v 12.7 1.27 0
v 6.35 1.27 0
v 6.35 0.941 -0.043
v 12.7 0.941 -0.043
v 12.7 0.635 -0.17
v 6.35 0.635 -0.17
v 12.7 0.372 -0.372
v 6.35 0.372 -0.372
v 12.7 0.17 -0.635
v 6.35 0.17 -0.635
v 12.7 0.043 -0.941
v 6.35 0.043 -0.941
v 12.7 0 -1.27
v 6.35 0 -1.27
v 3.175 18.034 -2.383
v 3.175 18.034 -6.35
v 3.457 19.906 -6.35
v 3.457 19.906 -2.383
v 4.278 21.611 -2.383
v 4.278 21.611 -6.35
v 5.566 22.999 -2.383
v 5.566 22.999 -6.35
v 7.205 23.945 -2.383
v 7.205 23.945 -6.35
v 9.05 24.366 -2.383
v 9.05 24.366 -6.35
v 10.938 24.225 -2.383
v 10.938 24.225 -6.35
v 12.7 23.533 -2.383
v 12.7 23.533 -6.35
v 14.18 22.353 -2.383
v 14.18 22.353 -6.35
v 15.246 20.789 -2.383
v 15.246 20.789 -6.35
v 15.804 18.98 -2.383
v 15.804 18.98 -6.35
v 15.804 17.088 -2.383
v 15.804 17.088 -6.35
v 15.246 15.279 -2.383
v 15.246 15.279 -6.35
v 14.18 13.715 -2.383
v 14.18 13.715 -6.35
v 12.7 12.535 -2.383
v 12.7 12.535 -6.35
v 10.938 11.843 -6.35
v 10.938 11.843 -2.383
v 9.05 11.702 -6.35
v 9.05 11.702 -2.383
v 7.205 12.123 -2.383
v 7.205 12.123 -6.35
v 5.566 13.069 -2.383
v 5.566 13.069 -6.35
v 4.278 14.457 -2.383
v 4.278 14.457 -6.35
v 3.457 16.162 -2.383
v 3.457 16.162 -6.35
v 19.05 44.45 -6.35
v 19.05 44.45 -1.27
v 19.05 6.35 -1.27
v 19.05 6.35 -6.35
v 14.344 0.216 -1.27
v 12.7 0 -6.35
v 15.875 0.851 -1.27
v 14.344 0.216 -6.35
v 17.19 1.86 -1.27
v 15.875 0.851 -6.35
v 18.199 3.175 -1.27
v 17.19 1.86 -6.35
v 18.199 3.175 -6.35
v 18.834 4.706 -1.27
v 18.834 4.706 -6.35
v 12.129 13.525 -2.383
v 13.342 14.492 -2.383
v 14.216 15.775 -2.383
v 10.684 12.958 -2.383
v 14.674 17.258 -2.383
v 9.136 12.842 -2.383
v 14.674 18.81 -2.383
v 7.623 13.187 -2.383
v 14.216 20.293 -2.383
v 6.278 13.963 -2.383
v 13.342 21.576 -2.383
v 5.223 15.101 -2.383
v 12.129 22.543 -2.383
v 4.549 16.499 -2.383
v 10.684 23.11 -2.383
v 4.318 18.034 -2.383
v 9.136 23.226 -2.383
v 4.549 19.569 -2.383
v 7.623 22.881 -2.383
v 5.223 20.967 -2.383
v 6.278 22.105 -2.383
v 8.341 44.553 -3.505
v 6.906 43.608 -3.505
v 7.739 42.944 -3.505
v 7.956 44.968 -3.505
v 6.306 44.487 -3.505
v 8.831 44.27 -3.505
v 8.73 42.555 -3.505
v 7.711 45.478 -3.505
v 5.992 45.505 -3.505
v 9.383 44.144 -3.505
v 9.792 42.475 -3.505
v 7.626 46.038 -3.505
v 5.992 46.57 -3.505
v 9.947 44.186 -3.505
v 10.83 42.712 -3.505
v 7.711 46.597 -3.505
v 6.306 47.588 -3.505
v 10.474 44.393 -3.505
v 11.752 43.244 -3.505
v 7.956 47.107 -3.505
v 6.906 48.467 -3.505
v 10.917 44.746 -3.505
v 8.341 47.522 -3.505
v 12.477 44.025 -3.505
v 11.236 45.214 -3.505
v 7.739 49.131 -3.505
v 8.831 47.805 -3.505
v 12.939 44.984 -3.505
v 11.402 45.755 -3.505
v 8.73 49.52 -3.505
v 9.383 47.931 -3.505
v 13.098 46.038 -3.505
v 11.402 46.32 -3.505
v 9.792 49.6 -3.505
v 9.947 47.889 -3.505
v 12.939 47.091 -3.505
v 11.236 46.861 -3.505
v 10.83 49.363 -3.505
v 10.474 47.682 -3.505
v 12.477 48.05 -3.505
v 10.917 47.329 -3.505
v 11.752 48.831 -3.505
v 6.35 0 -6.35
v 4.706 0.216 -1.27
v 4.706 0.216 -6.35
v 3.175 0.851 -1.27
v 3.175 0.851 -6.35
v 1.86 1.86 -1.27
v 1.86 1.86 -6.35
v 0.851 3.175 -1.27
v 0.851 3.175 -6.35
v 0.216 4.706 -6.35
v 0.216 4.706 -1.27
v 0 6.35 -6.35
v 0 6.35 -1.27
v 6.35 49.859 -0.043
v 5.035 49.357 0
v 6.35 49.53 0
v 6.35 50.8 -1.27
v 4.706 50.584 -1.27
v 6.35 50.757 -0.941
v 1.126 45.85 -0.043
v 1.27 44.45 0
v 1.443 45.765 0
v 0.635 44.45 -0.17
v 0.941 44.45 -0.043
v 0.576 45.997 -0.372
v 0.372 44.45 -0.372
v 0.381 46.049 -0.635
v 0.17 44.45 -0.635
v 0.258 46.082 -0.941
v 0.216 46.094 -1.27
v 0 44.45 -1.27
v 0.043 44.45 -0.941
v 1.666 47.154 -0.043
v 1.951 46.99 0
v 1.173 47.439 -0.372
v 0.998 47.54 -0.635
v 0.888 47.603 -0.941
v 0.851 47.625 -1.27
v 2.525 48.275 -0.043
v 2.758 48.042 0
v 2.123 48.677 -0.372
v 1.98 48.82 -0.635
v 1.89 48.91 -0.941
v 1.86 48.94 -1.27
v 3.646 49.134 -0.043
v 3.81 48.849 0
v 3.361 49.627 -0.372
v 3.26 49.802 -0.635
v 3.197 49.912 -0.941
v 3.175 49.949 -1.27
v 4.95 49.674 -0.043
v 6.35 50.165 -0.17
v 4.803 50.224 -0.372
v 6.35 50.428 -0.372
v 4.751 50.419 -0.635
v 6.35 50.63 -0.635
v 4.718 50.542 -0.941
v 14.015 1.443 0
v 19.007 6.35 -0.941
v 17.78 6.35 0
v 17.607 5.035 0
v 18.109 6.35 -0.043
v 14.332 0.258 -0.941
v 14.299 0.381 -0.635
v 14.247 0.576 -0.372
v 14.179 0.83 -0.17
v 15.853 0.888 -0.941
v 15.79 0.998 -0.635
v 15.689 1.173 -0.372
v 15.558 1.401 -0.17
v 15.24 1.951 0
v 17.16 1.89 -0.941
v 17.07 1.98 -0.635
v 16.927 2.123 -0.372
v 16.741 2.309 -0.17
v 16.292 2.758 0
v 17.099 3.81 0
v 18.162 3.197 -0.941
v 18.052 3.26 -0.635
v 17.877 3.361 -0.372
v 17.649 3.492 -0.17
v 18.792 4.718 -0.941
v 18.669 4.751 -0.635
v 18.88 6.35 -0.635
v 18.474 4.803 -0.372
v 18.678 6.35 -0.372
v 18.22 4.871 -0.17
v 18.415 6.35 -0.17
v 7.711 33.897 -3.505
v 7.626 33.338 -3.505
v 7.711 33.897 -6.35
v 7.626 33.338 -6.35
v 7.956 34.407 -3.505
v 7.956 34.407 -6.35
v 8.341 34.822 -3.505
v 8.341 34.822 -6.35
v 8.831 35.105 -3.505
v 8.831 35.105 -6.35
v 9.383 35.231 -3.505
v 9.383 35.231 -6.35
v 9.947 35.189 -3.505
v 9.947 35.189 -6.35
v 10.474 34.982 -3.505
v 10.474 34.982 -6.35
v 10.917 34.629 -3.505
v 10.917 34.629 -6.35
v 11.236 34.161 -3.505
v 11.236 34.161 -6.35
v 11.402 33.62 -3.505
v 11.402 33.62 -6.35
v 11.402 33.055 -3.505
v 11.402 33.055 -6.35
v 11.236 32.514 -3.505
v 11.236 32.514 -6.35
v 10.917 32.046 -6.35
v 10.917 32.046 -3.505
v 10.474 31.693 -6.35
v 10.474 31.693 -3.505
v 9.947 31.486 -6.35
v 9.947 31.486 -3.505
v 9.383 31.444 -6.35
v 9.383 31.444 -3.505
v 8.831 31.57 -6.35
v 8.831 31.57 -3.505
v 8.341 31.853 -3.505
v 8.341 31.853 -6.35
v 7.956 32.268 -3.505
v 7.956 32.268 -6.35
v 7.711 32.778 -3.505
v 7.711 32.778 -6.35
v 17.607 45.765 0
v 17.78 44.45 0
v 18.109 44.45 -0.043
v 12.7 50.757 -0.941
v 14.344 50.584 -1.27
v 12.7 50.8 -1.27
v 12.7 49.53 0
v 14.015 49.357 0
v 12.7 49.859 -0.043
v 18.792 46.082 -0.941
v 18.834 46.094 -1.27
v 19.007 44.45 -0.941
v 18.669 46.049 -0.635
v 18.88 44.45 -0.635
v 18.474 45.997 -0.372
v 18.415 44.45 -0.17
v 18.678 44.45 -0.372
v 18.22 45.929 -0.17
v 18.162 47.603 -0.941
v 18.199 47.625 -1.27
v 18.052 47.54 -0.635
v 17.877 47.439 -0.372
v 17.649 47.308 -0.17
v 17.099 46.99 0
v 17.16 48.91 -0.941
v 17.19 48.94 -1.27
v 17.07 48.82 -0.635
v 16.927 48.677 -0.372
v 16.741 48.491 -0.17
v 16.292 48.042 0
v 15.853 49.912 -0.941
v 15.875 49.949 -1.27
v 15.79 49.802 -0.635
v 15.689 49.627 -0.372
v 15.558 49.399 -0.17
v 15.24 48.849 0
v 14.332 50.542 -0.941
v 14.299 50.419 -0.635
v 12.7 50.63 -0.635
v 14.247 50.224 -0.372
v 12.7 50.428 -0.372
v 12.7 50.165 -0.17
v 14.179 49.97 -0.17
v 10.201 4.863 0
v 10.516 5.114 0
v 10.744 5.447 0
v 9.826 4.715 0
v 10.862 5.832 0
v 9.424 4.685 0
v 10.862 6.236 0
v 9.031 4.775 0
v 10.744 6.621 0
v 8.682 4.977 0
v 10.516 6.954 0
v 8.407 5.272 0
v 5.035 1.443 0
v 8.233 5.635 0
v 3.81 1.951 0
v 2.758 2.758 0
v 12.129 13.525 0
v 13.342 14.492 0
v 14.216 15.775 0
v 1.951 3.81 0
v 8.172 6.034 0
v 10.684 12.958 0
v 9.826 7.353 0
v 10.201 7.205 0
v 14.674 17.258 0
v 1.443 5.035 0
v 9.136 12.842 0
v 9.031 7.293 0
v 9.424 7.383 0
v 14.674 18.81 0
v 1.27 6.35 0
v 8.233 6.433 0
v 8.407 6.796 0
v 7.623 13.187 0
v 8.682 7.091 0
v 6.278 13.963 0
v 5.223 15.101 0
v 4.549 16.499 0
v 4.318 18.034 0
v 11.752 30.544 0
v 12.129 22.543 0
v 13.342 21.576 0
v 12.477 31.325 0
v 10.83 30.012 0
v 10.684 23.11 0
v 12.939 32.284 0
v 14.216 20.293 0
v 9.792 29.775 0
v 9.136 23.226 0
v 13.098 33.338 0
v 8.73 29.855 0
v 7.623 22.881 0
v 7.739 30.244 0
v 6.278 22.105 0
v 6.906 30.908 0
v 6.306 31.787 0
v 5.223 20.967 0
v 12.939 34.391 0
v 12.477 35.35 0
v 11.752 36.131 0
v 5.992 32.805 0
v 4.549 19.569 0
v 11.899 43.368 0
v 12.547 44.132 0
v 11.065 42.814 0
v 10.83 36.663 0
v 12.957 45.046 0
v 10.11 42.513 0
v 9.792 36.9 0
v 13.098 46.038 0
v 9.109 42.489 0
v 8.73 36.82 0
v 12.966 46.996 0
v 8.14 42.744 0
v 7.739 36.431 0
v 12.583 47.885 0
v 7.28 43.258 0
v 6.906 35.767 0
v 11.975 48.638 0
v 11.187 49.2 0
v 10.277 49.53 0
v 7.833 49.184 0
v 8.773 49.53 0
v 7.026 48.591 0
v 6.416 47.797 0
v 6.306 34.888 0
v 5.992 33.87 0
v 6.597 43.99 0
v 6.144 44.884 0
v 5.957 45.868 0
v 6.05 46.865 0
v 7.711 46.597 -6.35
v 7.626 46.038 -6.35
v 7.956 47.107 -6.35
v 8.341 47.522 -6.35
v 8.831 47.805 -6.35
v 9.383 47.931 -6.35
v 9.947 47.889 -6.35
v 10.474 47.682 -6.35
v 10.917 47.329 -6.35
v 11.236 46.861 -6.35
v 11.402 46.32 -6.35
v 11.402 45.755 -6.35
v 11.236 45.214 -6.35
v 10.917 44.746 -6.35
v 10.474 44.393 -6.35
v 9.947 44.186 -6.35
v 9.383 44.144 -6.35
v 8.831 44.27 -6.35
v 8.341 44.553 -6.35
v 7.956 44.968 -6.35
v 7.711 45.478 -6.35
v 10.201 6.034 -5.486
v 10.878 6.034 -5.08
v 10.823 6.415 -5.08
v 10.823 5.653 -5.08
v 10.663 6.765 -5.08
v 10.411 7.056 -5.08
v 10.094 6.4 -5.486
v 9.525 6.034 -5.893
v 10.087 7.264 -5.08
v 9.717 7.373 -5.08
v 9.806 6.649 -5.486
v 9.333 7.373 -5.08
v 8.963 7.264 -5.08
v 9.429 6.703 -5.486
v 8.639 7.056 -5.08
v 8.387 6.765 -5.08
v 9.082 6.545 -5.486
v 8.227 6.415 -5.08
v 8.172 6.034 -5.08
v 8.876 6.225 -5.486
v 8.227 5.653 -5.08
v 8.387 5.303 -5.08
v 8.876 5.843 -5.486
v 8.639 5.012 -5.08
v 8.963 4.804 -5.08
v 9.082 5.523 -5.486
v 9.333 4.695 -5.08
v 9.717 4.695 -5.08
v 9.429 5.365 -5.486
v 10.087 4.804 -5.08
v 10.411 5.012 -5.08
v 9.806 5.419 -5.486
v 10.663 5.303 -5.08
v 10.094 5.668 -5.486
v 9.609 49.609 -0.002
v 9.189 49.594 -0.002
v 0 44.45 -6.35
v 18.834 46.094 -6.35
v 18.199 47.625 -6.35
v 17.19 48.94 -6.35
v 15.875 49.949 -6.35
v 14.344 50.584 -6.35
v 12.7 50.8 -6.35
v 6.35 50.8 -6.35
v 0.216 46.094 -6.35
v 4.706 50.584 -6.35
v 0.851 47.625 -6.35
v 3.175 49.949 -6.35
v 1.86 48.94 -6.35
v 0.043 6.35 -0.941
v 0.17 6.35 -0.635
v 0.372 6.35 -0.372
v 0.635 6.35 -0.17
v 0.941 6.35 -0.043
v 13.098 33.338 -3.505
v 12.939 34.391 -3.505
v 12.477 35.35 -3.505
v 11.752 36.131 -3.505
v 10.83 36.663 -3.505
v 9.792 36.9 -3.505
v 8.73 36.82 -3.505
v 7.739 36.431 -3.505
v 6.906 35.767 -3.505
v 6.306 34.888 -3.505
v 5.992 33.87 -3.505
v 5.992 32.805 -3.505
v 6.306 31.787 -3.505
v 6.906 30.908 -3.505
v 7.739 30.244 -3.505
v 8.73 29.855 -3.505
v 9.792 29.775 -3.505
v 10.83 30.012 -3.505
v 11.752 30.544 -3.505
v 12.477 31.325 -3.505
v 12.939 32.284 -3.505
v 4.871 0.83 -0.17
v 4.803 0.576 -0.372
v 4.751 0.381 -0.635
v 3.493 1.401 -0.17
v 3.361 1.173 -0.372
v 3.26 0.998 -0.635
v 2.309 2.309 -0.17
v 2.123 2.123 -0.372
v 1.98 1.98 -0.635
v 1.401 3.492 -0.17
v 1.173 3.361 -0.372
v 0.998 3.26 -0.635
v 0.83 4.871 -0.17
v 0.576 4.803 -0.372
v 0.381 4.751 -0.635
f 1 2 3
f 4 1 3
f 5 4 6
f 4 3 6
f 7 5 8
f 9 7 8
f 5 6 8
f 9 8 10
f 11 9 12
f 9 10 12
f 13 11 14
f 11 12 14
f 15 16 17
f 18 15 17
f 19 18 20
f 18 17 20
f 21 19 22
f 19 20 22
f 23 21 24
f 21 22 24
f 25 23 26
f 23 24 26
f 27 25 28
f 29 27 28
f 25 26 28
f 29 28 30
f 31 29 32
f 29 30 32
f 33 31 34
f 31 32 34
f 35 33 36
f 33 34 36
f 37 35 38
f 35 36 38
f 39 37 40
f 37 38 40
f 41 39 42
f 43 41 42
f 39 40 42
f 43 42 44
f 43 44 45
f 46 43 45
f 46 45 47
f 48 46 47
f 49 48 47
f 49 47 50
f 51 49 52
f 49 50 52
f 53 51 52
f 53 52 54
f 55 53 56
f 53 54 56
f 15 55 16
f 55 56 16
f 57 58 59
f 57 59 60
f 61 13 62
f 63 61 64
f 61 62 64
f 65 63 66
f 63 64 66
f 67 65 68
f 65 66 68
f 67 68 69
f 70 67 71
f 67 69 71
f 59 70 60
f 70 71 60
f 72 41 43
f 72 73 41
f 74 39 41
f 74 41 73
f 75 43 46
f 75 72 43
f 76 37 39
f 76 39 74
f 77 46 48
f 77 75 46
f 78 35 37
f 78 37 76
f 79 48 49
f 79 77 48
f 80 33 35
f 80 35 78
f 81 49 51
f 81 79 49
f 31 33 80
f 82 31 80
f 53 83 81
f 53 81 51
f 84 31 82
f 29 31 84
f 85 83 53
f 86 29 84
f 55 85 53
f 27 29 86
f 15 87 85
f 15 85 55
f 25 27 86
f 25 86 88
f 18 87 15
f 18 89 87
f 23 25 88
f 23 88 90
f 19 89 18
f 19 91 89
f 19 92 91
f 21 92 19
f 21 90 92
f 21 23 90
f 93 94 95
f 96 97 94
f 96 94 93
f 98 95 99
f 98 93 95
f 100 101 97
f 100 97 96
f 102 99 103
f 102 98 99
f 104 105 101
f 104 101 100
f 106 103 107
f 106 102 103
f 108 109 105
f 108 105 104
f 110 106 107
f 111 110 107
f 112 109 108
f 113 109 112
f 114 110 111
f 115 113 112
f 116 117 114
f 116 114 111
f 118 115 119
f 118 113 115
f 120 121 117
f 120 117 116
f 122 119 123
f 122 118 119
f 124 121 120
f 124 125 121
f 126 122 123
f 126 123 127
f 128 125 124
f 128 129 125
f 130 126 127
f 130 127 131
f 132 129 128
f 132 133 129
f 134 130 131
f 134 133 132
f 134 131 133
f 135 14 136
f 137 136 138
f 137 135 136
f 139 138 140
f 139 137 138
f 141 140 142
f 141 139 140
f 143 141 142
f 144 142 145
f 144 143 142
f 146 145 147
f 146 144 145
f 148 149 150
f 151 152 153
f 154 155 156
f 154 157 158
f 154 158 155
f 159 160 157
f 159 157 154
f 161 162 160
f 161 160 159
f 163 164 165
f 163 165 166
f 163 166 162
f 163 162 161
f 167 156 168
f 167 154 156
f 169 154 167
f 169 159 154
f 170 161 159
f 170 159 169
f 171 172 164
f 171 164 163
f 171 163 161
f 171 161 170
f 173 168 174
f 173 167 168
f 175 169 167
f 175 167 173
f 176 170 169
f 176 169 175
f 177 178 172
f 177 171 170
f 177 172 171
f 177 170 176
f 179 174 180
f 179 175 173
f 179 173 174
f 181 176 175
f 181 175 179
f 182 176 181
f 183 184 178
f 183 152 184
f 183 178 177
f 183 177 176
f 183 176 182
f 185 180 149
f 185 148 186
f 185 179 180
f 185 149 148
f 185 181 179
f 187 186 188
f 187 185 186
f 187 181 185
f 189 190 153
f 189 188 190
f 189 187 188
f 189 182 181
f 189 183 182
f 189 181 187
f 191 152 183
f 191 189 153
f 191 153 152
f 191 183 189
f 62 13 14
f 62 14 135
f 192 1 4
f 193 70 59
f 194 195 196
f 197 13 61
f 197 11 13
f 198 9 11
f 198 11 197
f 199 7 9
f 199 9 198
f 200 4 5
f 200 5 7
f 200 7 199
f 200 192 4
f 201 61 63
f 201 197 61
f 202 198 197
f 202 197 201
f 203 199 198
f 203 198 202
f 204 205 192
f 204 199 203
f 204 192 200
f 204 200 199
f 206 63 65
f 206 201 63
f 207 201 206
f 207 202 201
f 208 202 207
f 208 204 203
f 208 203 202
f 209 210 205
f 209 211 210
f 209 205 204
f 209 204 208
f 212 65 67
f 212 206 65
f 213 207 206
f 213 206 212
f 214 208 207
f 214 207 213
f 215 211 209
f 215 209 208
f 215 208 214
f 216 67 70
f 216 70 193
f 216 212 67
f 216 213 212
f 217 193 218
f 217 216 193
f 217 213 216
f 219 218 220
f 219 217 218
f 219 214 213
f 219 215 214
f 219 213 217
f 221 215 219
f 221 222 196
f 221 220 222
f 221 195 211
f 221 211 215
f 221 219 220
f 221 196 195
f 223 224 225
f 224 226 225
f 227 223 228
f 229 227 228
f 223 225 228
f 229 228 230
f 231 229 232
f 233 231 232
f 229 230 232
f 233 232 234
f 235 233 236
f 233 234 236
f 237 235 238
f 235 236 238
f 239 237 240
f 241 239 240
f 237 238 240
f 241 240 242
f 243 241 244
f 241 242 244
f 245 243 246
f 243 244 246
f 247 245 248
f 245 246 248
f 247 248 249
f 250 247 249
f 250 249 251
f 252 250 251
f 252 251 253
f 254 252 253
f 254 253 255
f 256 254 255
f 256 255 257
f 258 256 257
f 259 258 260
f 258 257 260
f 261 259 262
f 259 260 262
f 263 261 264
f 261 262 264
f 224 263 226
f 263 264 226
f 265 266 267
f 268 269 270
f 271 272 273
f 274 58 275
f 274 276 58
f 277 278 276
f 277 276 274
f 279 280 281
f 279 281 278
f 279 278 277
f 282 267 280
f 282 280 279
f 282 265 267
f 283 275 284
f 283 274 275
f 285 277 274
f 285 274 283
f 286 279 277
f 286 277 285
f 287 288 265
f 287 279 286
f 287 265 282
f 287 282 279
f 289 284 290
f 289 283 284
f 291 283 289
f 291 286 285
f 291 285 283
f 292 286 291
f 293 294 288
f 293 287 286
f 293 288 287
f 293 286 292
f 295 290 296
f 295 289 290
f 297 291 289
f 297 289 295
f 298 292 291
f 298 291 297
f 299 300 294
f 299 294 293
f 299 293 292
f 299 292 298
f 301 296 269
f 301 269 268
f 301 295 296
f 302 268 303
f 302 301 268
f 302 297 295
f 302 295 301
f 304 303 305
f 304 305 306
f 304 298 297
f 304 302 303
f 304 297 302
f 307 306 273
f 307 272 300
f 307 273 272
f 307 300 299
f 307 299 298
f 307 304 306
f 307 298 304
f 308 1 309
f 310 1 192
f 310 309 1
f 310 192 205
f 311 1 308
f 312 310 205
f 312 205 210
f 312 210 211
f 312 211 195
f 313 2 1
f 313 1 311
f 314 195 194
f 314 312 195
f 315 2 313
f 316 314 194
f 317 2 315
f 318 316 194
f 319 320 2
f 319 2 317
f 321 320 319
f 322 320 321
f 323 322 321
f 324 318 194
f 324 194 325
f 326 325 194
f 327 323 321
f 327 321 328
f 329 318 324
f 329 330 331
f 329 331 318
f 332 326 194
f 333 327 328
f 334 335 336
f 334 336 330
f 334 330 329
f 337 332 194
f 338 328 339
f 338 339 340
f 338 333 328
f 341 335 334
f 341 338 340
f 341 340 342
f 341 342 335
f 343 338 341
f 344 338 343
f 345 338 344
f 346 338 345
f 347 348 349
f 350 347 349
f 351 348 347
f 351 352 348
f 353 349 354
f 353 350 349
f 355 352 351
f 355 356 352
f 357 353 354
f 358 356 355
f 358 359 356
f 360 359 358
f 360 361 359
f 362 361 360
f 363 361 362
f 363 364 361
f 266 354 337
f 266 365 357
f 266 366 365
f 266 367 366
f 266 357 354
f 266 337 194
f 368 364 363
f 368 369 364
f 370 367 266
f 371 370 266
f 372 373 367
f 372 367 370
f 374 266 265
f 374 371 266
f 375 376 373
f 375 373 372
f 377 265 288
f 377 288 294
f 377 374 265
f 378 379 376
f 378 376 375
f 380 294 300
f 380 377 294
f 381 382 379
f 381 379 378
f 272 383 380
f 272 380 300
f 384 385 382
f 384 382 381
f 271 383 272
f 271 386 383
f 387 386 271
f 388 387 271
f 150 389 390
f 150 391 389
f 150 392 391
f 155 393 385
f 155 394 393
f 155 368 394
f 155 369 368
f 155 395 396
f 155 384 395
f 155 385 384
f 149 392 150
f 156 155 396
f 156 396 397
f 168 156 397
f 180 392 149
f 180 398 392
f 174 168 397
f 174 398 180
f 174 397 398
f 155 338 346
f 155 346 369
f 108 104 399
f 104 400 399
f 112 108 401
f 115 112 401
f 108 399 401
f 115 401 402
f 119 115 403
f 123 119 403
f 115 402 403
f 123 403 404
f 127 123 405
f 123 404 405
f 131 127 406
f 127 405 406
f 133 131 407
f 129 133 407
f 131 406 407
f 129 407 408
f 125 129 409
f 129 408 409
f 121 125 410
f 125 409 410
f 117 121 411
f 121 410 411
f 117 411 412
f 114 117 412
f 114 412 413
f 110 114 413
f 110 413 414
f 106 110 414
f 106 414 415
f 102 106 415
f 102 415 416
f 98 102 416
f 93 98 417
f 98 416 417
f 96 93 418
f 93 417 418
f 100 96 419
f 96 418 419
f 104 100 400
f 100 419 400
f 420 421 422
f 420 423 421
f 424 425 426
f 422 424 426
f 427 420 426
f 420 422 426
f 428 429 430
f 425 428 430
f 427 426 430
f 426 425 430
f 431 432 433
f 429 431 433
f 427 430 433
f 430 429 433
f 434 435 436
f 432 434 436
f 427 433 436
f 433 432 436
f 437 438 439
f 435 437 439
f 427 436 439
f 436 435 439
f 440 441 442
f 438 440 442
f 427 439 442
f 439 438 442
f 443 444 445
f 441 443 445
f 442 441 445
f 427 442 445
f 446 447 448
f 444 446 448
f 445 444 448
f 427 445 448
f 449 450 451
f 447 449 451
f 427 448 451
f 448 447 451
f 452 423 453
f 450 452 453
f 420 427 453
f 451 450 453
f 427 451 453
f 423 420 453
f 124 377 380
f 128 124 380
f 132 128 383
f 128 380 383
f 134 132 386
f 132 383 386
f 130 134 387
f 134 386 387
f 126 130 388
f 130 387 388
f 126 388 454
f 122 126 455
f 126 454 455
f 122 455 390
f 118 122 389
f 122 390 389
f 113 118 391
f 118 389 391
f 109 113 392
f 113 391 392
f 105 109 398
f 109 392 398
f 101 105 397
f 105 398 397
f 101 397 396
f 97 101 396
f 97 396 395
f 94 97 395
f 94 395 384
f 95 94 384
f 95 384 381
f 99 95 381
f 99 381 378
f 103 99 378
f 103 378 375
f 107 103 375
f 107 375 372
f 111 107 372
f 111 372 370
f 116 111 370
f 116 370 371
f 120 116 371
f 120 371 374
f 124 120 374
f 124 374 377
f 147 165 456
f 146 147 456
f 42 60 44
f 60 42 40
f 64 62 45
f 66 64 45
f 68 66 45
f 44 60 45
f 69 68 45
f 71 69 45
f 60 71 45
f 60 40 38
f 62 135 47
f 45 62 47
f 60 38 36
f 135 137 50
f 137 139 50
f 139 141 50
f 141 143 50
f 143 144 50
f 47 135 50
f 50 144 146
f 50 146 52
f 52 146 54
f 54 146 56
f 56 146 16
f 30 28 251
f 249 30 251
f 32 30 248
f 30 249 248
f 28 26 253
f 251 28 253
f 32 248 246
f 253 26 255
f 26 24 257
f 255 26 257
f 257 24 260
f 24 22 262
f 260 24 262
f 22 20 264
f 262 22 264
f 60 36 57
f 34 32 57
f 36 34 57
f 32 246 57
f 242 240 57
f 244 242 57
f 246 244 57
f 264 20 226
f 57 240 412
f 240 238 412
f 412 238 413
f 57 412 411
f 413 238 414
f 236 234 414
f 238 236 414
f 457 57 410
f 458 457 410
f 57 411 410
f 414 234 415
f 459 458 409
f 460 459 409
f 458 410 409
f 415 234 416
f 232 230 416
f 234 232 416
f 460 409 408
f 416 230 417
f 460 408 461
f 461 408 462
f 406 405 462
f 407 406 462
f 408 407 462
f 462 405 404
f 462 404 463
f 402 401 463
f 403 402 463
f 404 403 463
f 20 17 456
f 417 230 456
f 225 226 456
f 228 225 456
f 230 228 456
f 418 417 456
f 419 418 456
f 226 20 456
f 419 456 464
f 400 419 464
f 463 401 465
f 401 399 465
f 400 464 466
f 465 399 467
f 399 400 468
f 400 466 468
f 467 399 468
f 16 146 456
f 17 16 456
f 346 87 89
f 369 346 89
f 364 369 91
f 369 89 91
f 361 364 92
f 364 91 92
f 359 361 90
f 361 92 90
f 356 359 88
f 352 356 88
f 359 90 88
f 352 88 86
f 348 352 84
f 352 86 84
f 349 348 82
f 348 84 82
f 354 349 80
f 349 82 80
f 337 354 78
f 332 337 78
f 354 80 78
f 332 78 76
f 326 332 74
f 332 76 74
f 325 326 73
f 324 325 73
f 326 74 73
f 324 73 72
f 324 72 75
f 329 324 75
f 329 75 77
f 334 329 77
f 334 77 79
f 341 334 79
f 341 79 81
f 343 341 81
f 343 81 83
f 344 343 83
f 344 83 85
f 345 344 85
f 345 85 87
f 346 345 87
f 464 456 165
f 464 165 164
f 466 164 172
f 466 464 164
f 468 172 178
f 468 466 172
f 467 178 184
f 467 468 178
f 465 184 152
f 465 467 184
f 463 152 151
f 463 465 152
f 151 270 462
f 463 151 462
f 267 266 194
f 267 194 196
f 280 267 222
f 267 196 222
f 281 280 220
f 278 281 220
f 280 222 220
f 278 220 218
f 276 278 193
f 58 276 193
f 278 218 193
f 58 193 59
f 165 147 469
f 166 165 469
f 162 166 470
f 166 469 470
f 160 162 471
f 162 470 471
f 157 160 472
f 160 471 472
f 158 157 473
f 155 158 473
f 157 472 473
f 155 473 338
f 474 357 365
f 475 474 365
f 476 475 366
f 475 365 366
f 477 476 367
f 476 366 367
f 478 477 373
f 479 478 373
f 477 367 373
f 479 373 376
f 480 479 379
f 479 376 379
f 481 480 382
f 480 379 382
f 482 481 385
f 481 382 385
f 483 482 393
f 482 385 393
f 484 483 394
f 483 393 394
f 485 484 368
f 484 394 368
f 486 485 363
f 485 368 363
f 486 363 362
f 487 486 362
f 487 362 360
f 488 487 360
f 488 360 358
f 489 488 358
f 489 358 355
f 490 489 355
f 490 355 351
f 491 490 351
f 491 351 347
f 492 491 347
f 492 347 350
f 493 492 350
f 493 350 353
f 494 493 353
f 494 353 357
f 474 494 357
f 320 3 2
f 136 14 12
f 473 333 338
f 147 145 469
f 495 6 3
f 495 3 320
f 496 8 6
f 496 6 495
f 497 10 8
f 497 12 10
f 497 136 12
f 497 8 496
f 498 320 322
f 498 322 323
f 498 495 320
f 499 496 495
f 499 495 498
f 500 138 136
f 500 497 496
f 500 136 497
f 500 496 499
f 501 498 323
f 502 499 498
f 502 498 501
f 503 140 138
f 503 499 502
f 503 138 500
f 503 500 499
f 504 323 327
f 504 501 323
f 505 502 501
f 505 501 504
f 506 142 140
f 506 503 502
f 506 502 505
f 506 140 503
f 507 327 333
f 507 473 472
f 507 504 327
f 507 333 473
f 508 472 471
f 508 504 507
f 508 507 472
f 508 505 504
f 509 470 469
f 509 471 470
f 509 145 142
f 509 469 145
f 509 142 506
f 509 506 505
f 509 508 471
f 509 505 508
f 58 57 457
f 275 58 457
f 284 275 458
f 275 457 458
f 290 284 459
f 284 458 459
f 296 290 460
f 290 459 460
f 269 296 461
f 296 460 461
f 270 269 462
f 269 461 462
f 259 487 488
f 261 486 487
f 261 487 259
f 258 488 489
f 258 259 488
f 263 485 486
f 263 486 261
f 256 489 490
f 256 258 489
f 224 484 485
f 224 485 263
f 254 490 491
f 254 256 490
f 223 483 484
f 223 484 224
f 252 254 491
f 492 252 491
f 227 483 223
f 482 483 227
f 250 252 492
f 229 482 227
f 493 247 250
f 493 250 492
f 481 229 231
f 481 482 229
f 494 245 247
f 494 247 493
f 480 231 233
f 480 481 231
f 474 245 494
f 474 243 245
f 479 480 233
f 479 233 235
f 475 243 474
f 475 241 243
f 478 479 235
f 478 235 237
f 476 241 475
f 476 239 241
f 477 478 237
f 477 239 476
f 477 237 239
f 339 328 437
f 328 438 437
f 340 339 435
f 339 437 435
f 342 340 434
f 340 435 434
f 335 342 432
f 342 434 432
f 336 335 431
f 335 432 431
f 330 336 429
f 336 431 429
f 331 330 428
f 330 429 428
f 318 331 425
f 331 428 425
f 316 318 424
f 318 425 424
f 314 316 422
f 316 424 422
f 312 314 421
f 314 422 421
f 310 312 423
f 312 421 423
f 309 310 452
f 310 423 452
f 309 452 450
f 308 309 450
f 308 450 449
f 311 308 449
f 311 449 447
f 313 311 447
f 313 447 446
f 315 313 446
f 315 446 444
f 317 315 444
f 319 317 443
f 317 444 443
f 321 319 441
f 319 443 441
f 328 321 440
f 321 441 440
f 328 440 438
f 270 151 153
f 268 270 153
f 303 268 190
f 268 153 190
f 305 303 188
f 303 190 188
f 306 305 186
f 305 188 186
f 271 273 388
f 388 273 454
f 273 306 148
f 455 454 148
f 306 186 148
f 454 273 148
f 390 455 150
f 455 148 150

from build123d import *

# Parameters (mm, degrees)
SKETCH1_W                                      = 6.35
SKETCH1_H                                      = 50.8
BODY_DEPTH                                     = 19.05
SKETCH2_R                                      = 5.207
PITCH_AXLE_OPENING_DEPTH                       = 6.35
CBORE_FOR_6_SOCKET_HEAD_CAP_SCREW1_D           = 3.7973
CBORE_FOR_6_SOCKET_HEAD_CAP_SCREW1_CBORE_D     = 7.14502
CBORE_FOR_6_SOCKET_HEAD_CAP_SCREW1_CBORE_DEPTH = 3.5052
F_6_32_TAPPED_HOLE1_D                          = 2.7051
F_6_32_TAPPED_HOLE1_DEPTH                      = 5.08
F_6_32_TAPPED_HOLE1_TIP                        = 0.81269403
SKETCH2_3_R                                    = 6.35
SKETCH2_3_R_2                                  = 5.207
PITCH_BEARING_RECESS_DEPTH                     = 3.96748
FILLET1_R                                      = 6.35
FILLET2_R                                      = 1.27


with BuildPart() as part:
    # Sketch1 → Body (new body)
    with BuildSketch(Plane(origin=(0, 0, 0), x_dir=(0, 0, -1), z_dir=(1, 0, 0))):
        with Locations((3.175, 25.4)):
            Rectangle(SKETCH1_W, SKETCH1_H)
    extrude(amount=BODY_DEPTH)

    # Sketch2 → Pitch Axle Opening (cut)
    with BuildSketch(Plane(origin=(0, 0, -6.35), x_dir=(-1, 0, 0), z_dir=(0, 0, -1))):
        with Locations((-9.525, 18.034)):
            Circle(SKETCH2_R)
    extrude(amount=-PITCH_AXLE_OPENING_DEPTH, mode=Mode.SUBTRACT)

    # CBORE for #6 Socket Head Cap Screw1 (through all)
    with Locations(Plane.XY):
        with Locations((9.525, 46.0375), (9.525, 33.3375)):
            CounterBoreHole(CBORE_FOR_6_SOCKET_HEAD_CAP_SCREW1_D / 2, CBORE_FOR_6_SOCKET_HEAD_CAP_SCREW1_CBORE_D / 2, CBORE_FOR_6_SOCKET_HEAD_CAP_SCREW1_CBORE_DEPTH)

    # #6-32 Tapped Hole1
    with Locations(Plane(origin=(9.525, 6.034, 0), x_dir=(1, 0, 0), z_dir=(0, 0, 1))):
        with Locations((0, 0)):
            Hole(F_6_32_TAPPED_HOLE1_D / 2, depth=F_6_32_TAPPED_HOLE1_DEPTH)
            with Locations((0, 0, -(F_6_32_TAPPED_HOLE1_DEPTH + F_6_32_TAPPED_HOLE1_TIP / 2))):  # 118° drill point
                Cone(0, F_6_32_TAPPED_HOLE1_D / 2, F_6_32_TAPPED_HOLE1_TIP, mode=Mode.SUBTRACT)

    # Sketch2<3> → Pitch Bearing Recess (cut)
    with BuildSketch(Plane(origin=(0, 0, -6.35), x_dir=(-1, 0, 0), z_dir=(0, 0, -1))):
        with Locations((-9.525, 18.034)):
            Circle(SKETCH2_3_R)
        with Locations((-9.525, 18.034)):
            Circle(SKETCH2_3_R_2, mode=Mode.SUBTRACT)
    extrude(amount=-PITCH_BEARING_RECESS_DEPTH, mode=Mode.SUBTRACT)

    # Fillet1
    fillet1_edges = [part.edges().sort_by_distance(p)[0] for p in [
        (19.05, 50.8, -3.175),
        (19.05, 0, -3.175),
        (0, 50.8, -3.175),
        (0, 0, -3.175),
    ]]
    fillet(fillet1_edges, radius=FILLET1_R)

    # Fillet2
    # the kernel refuses this fillet: 1.27 mm, written as the material it takes off along each edge
    with BuildSketch(Plane(origin=(6.35, 50.8, 0), x_dir=(0, -1, 0), z_dir=(1, 0, 0))) as fillet2_piece_1:
        with BuildLine():
            CenterArc((FILLET2_R, FILLET2_R), FILLET2_R, 180, 90)
            Line((0, FILLET2_R), (0, 0))
            Line((0, 0), (FILLET2_R, 0))
        make_face()
    extrude(amount=6.35, mode=Mode.SUBTRACT)
    with BuildSketch(Plane(origin=(0, 6.35, 0), x_dir=(1, 0, 0), z_dir=(0, 1, 0))) as fillet2_piece_2:
        with BuildLine():
            CenterArc((FILLET2_R, FILLET2_R), FILLET2_R, 180, 90)
            Line((0, FILLET2_R), (0, 0))
            Line((0, 0), (FILLET2_R, 0))
        make_face()
    extrude(amount=38.1, mode=Mode.SUBTRACT)
    with BuildSketch(Plane(origin=(6.35, 0, 0), x_dir=(0, 1, 0), z_dir=(1, 0, 0))) as fillet2_piece_3:
        with BuildLine():
            CenterArc((FILLET2_R, -FILLET2_R), FILLET2_R, 90, 90)
            Line((0, -FILLET2_R), (0, 0))
            Line((0, 0), (FILLET2_R, 0))
        make_face()
    extrude(amount=6.35, mode=Mode.SUBTRACT)
    with BuildSketch(Plane(origin=(19.05, 6.35, 0), x_dir=(-1, 0, 0), z_dir=(0, 1, 0))) as fillet2_piece_4:
        with BuildLine():
            CenterArc((FILLET2_R, -FILLET2_R), FILLET2_R, 90, 90)
            Line((0, -FILLET2_R), (0, 0))
            Line((0, 0), (FILLET2_R, 0))
        make_face()
    extrude(amount=38.1, mode=Mode.SUBTRACT)
    with BuildSketch(Plane(origin=(12.7, 6.35, 0), x_dir=(0, -1, 0), z_dir=(-1, 0, 0))) as fillet2_piece_5:
        with BuildLine():
            CenterArc((6.35 - FILLET2_R, -FILLET2_R), FILLET2_R, 0, 90)
            Line((6.35, -FILLET2_R), (6.35, 0))
            Line((6.35, 0), (6.35 - FILLET2_R, 0))
        make_face()
    revolve(axis=Axis((12.7, 6.35, 0), (0, 0, 1)), revolution_arc=90, mode=Mode.SUBTRACT)
    with BuildSketch(Plane(origin=(6.35, 6.35, 0), x_dir=(0, -1, 0), z_dir=(1, 0, 0))) as fillet2_piece_6:
        with BuildLine():
            CenterArc((6.35 - FILLET2_R, FILLET2_R), FILLET2_R, 270, 90)
            Line((6.35, FILLET2_R), (6.35, 0))
            Line((6.35, 0), (6.35 - FILLET2_R, 0))
        make_face()
    revolve(axis=Axis((6.35, 6.35, 0), (0, 0, -1)), revolution_arc=90, mode=Mode.SUBTRACT)
    with BuildSketch(Plane(origin=(12.7, 44.45, 0), x_dir=(1, 0, 0), z_dir=(0, -1, 0))) as fillet2_piece_7:
        with BuildLine():
            CenterArc((6.35 - FILLET2_R, -FILLET2_R), FILLET2_R, 0, 90)
            Line((6.35, -FILLET2_R), (6.35, 0))
            Line((6.35, 0), (6.35 - FILLET2_R, 0))
        make_face()
    revolve(axis=Axis((12.7, 44.45, 0), (0, 0, 1)), revolution_arc=90, mode=Mode.SUBTRACT)
    with BuildSketch(Plane(origin=(6.35, 44.45, 0), x_dir=(-1, 0, 0), z_dir=(0, -1, 0))) as fillet2_piece_8:
        with BuildLine():
            CenterArc((6.35 - FILLET2_R, FILLET2_R), FILLET2_R, 270, 90)
            Line((6.35, FILLET2_R), (6.35, 0))
            Line((6.35, 0), (6.35 - FILLET2_R, 0))
        make_face()
    revolve(axis=Axis((6.35, 44.45, 0), (0, 0, -1)), revolution_arc=90, mode=Mode.SUBTRACT)


solid = part.part
